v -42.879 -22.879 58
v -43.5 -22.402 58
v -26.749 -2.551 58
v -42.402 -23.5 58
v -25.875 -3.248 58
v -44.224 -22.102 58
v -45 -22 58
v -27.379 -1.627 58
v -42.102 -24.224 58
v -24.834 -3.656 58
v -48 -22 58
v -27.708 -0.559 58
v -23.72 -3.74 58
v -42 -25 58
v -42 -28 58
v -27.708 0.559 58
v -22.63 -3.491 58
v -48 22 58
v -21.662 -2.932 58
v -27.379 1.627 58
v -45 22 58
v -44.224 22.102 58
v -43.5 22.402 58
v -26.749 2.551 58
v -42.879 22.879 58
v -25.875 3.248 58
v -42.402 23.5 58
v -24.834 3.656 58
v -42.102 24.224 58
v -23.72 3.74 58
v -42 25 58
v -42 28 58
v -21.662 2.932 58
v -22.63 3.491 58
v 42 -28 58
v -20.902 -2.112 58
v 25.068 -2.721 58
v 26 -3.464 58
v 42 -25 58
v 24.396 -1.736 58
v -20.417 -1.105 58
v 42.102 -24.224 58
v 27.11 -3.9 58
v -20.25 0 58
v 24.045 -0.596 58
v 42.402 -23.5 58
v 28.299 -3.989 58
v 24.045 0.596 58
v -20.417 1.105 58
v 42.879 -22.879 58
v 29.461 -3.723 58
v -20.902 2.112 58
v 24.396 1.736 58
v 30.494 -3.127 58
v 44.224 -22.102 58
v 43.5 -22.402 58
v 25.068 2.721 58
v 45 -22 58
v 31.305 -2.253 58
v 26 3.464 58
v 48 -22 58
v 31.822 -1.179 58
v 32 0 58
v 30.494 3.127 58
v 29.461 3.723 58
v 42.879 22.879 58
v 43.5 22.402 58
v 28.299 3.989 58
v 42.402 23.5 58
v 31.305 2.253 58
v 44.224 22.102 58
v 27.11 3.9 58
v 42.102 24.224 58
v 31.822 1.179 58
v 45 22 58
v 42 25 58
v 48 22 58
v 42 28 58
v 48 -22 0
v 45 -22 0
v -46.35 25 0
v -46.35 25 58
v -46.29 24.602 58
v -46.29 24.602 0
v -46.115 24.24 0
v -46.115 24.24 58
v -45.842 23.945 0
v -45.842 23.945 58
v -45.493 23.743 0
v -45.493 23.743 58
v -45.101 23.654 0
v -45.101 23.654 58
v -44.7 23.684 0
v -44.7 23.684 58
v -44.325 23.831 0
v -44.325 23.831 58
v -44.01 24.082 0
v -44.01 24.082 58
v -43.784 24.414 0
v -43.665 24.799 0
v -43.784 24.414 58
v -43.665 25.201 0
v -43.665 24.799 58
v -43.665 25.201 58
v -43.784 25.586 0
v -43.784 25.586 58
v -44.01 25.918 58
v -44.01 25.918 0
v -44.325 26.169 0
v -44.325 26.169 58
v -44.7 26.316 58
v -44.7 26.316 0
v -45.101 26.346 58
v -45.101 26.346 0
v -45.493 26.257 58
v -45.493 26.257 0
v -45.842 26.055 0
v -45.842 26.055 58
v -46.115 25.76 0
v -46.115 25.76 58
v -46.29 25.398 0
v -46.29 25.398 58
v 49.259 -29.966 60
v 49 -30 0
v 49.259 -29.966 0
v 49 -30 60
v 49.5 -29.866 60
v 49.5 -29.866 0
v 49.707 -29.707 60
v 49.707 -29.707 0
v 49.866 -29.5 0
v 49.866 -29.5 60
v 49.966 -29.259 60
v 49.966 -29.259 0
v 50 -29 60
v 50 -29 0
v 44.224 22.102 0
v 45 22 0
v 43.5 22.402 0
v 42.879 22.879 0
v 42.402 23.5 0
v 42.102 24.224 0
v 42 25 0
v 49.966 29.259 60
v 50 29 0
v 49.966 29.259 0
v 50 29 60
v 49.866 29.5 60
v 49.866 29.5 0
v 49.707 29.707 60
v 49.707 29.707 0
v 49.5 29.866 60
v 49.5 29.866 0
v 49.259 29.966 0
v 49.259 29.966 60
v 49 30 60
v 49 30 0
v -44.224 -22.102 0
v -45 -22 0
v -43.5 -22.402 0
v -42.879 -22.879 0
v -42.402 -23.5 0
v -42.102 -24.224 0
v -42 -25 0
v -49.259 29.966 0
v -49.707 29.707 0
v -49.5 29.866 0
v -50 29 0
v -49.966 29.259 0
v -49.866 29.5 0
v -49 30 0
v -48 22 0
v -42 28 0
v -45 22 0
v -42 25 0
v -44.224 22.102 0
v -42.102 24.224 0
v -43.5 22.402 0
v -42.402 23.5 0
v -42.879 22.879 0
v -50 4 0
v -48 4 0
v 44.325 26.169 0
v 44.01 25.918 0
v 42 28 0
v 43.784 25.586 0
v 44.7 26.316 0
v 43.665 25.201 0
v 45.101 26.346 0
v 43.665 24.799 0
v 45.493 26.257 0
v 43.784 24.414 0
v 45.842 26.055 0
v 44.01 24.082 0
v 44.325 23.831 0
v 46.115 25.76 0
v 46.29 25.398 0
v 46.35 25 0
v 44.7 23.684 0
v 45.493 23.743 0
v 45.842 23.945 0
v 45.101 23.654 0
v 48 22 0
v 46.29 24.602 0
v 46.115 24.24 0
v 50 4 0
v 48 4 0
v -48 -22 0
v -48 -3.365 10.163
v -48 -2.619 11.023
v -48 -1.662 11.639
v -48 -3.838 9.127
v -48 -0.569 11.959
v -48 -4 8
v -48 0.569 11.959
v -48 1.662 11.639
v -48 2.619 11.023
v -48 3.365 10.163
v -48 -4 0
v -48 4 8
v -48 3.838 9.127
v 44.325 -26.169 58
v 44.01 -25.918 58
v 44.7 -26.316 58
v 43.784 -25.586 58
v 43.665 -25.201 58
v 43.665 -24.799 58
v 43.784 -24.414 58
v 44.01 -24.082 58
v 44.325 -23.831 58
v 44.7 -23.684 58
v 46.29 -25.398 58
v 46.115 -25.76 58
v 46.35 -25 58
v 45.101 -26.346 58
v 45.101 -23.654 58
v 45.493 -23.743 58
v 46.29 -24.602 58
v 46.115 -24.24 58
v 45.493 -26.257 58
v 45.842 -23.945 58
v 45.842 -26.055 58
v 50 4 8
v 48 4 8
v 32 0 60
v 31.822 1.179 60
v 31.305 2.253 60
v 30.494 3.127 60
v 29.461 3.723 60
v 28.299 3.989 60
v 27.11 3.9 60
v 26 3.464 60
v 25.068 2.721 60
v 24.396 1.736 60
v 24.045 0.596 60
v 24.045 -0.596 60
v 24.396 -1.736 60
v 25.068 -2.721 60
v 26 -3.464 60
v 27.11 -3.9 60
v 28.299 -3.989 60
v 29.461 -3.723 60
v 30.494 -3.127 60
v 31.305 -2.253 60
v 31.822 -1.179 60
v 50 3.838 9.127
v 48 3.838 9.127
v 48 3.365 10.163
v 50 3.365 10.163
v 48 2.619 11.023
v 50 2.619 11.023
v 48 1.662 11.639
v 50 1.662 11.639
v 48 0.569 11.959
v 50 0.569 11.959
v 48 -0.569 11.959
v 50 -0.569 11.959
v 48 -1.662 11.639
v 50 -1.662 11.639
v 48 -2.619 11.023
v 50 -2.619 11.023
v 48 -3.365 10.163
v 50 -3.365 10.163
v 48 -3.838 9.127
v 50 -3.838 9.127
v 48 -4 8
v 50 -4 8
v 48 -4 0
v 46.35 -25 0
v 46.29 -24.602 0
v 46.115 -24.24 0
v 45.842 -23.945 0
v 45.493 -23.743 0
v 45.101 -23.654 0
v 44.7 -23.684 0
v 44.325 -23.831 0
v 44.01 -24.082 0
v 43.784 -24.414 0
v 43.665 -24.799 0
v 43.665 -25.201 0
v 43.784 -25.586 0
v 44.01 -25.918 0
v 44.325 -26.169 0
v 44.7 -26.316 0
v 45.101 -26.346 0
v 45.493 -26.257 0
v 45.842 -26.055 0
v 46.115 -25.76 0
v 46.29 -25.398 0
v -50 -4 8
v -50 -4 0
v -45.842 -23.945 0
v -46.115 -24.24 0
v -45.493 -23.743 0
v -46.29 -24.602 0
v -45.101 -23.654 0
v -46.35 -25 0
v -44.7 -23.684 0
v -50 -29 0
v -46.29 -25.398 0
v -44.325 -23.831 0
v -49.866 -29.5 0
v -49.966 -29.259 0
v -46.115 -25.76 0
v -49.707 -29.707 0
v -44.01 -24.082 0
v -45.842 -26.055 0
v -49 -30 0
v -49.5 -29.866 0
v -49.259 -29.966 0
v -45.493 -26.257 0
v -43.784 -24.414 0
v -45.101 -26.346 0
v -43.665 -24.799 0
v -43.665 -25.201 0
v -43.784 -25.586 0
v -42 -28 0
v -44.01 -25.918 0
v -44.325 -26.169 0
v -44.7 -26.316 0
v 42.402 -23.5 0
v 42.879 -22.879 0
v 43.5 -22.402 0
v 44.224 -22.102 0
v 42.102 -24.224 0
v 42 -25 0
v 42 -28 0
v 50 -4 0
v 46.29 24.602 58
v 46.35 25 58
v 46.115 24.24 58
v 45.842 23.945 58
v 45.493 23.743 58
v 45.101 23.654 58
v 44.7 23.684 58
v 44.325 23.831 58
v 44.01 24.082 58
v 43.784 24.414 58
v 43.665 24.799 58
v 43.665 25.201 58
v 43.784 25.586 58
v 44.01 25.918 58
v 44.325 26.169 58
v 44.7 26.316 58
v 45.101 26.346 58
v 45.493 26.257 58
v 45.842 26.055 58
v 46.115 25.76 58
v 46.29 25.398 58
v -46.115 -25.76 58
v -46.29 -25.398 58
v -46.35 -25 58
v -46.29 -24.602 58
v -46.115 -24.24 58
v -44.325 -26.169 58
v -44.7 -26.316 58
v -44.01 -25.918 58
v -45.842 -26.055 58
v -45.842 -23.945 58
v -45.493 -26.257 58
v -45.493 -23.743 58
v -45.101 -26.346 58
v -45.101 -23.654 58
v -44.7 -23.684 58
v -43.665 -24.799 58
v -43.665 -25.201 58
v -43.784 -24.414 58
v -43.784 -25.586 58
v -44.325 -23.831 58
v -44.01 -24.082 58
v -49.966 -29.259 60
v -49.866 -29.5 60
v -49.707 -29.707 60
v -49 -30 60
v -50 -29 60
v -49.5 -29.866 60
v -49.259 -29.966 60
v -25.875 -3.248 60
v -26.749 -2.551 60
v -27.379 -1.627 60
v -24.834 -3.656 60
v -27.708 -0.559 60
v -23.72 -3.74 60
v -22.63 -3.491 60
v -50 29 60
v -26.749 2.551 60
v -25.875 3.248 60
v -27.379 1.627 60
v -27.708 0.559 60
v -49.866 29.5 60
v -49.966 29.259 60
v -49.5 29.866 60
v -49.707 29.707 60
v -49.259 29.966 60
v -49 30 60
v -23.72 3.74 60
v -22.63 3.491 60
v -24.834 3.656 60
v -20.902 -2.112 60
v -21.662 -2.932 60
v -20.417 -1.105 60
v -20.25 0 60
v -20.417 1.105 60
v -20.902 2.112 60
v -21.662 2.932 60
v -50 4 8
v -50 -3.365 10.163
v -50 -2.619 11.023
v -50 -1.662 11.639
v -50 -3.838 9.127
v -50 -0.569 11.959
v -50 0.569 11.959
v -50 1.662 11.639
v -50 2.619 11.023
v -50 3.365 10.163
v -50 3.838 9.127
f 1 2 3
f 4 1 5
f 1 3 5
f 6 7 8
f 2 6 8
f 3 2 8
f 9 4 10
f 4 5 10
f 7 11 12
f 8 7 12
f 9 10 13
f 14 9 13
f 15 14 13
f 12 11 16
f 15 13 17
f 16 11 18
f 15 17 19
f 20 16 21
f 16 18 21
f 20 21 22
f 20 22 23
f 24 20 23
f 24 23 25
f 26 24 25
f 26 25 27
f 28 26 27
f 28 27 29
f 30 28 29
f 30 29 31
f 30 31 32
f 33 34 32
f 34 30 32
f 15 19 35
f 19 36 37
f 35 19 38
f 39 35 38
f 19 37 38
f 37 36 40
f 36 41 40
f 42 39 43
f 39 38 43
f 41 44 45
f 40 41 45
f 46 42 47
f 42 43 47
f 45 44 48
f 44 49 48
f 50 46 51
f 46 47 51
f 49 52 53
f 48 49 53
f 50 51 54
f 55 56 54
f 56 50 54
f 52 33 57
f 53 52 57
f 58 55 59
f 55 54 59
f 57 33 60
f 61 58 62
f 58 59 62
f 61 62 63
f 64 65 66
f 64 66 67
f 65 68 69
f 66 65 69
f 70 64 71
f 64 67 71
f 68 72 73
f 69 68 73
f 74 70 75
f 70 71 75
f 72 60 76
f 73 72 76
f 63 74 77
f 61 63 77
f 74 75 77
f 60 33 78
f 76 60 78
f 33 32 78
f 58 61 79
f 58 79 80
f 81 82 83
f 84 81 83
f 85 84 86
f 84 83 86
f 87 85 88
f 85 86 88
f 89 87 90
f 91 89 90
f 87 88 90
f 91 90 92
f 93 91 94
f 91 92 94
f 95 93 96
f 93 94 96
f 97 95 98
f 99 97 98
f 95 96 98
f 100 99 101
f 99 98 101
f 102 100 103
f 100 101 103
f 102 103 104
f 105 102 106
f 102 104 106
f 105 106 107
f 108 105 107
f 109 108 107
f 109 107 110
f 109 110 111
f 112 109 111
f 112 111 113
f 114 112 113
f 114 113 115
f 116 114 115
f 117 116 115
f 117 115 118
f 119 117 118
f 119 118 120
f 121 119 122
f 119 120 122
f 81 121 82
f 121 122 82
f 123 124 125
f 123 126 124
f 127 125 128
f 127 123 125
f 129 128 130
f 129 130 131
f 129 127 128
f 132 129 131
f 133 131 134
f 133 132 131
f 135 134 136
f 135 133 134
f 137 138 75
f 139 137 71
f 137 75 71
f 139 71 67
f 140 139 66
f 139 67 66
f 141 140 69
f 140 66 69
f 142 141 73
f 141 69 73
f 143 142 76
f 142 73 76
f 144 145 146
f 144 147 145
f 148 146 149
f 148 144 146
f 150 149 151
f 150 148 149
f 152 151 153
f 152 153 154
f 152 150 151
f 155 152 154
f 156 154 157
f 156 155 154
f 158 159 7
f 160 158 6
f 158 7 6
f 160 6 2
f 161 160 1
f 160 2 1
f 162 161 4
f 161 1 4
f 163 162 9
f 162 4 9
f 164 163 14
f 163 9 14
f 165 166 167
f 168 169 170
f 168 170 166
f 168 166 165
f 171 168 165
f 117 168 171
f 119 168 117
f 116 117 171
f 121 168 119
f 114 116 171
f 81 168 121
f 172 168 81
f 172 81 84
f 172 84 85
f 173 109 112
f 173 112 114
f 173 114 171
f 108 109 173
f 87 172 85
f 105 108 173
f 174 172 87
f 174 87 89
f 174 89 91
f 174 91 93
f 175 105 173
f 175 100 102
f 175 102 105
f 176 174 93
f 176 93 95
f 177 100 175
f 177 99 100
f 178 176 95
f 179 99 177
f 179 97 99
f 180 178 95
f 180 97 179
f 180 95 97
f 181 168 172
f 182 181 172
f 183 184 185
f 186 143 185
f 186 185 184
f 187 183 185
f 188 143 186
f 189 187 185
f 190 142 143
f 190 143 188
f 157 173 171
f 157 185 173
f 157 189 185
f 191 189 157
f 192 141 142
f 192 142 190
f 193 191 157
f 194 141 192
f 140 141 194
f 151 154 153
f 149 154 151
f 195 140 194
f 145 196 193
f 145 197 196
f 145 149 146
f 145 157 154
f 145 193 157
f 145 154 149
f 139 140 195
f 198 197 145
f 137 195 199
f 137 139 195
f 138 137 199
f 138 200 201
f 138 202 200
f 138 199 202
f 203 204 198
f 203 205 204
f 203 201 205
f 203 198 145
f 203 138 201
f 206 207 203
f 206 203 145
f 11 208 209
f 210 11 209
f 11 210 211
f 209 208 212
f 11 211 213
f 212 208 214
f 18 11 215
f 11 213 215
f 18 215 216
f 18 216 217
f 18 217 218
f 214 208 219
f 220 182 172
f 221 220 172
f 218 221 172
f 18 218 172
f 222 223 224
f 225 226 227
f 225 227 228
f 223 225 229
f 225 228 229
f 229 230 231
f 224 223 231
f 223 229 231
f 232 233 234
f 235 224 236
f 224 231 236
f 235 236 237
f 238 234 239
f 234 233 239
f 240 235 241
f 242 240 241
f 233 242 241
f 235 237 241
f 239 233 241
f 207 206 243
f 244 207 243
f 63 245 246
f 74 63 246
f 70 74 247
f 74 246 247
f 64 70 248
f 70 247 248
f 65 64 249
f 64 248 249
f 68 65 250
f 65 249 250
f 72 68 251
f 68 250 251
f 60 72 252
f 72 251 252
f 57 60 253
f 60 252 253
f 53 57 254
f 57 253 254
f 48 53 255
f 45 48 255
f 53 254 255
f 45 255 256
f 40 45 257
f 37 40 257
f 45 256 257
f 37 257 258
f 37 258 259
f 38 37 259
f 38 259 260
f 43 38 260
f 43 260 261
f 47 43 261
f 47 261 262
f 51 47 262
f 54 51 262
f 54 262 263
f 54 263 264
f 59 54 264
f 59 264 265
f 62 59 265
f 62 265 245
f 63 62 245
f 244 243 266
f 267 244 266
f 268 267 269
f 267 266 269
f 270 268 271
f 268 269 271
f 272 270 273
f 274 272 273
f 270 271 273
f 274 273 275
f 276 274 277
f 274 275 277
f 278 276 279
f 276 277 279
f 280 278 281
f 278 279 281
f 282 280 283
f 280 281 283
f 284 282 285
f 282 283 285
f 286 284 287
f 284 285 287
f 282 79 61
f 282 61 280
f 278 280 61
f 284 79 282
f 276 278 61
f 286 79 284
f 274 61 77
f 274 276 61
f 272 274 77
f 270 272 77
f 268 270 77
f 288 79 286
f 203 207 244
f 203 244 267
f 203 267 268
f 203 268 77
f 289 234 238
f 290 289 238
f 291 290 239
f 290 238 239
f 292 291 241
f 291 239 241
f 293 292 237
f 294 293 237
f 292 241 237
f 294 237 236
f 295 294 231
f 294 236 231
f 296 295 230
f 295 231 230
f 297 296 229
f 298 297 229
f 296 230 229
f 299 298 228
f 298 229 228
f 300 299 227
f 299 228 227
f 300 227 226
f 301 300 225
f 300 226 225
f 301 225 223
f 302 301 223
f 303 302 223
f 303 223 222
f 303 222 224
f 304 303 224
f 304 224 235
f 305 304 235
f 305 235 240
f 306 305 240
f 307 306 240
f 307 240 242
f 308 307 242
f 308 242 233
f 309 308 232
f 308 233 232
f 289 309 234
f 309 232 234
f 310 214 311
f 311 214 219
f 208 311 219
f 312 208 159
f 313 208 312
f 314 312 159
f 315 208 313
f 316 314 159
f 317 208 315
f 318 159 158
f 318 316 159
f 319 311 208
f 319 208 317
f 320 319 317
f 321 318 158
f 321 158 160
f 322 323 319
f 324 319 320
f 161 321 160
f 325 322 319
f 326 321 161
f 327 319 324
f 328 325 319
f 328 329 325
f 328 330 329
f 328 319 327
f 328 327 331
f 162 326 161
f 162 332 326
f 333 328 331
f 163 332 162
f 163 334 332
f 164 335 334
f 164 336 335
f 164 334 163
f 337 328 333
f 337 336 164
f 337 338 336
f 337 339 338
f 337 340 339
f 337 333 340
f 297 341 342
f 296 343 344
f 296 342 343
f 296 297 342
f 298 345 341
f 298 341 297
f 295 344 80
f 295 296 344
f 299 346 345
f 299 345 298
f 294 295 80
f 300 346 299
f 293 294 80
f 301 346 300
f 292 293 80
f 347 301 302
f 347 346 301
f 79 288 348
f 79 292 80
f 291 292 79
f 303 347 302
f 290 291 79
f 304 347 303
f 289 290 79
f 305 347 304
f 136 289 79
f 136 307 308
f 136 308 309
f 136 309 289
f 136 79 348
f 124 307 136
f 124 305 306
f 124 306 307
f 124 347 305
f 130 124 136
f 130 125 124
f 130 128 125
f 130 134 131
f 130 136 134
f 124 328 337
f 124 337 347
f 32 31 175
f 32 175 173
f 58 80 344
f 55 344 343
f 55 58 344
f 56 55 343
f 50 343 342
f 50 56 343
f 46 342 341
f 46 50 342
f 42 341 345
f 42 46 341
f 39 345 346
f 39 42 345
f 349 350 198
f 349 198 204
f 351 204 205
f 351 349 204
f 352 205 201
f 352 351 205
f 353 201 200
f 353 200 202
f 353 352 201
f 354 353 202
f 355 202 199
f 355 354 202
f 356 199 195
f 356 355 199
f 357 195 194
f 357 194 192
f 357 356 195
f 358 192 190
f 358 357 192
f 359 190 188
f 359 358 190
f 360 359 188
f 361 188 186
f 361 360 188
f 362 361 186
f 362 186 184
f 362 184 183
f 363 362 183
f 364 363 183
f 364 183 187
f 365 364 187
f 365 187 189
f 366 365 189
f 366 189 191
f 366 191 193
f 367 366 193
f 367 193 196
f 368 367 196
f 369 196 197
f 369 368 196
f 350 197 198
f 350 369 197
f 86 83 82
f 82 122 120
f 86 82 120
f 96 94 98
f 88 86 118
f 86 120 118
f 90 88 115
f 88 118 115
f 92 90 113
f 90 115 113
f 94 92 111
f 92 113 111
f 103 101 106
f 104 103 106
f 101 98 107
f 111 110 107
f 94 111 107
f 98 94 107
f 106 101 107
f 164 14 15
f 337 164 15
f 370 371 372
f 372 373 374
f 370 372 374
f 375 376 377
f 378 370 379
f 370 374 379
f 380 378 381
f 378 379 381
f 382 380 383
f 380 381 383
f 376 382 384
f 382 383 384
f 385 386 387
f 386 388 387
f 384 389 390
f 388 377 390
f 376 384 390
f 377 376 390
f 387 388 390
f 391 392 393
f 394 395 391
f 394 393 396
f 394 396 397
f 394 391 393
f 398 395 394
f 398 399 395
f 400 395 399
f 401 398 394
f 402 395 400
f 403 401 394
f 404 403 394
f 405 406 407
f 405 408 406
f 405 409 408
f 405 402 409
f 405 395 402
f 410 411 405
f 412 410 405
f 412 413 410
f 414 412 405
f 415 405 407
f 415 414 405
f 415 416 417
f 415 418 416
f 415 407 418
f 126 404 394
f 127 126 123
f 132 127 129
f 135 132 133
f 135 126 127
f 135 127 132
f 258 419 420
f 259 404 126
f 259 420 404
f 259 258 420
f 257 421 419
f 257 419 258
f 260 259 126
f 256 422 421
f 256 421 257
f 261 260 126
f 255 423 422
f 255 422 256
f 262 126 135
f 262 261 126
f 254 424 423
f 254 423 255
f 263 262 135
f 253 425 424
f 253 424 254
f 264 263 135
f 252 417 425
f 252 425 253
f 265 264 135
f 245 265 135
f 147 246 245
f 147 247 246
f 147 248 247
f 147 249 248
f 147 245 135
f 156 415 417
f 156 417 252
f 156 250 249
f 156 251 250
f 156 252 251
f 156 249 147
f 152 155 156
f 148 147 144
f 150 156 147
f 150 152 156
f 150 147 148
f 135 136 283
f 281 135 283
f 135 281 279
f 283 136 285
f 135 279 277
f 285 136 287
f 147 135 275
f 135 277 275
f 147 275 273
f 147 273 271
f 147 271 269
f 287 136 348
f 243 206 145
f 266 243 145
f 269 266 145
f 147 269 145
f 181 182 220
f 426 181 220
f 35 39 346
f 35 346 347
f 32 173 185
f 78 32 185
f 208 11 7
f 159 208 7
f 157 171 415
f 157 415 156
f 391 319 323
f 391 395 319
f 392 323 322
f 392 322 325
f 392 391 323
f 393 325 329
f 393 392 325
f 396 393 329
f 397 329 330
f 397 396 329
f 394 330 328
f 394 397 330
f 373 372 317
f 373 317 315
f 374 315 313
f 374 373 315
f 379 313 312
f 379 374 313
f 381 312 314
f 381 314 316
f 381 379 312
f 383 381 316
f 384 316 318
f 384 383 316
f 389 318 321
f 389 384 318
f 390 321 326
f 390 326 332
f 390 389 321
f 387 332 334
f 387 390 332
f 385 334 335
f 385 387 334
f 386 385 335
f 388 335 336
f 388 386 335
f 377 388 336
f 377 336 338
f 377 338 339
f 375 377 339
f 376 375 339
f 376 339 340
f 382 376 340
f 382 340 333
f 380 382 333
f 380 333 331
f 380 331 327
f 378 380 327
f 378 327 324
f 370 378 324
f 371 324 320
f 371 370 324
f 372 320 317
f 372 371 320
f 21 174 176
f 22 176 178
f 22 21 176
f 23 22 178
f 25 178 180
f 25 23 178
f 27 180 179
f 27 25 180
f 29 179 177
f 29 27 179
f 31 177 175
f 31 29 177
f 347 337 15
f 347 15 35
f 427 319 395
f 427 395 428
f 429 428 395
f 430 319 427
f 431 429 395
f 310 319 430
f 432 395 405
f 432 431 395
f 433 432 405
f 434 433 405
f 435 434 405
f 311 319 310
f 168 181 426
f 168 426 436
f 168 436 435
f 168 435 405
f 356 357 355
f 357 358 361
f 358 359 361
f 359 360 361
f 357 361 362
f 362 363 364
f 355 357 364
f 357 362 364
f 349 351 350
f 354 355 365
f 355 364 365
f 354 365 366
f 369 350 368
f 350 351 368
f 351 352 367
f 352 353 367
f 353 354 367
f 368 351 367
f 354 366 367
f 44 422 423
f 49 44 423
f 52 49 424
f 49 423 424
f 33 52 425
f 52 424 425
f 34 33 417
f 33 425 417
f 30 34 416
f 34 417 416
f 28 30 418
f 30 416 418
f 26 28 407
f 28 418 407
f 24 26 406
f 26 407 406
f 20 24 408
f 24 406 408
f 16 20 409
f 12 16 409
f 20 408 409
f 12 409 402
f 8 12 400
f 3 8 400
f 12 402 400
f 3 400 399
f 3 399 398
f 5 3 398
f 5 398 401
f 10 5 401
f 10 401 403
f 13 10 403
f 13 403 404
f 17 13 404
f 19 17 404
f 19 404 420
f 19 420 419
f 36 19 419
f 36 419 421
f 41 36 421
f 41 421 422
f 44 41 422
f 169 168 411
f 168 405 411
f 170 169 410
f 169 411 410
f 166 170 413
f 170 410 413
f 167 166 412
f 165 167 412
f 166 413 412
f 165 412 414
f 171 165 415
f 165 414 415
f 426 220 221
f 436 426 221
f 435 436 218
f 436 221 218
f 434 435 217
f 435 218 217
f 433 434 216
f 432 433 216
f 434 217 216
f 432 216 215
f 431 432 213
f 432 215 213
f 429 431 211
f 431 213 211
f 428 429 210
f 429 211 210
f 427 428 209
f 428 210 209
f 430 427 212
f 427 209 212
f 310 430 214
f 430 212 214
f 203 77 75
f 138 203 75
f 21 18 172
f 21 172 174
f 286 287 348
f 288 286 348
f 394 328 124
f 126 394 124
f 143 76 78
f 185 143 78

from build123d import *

# Parameters (mm, degrees)
SKETCH1_W               = 100
SKETCH1_H               = 60
BOSS_EXTRUDE1_DEPTH     = 60
SHELL1_T                = -2
SKETCH2_R               = 3.75
SKETCH2_R_2             = 4
CUT_EXTRUDE1_DEPTH      = 60
SKETCH3_R               = 1.35
BOSS_EXTRUDE4_DEPTH     = 58
MIRROR2_COPY_1_SKETCH_R = 1.35
MIRROR2_COPY_1_DEPTH    = 58
FILLET1_R               = 1
CUT_EXTRUDE2_DEPTH      = 121.415945788


with BuildPart() as part:
    # Sketch1 → Boss-Extrude1 (new body)
    with BuildSketch(Plane.XY):
        Rectangle(SKETCH1_W, SKETCH1_H)
    extrude(amount=BOSS_EXTRUDE1_DEPTH)

    # Shell1
    shell1_openings = [part.faces().sort_by_distance(p)[0] for p in [
        (0, 0, 0),
    ]]
    offset(amount=SHELL1_T, openings=shell1_openings, kind=Kind.INTERSECTION)

    # Sketch2 → Cut-Extrude1 (cut)
    with BuildSketch(Plane.XY.offset(60)):
        with Locations((-24, 0)):
            Circle(SKETCH2_R)
        with Locations((28, 0)):
            Circle(SKETCH2_R_2)
    extrude(amount=-CUT_EXTRUDE1_DEPTH, mode=Mode.SUBTRACT)

    # Sketch3 → Boss-Extrude4 (add)
    with BuildSketch(Plane(origin=(0, 0, 58), x_dir=(-1, 0, 0), z_dir=(0, 0, -1))):
        with BuildLine():
            Line((-42, 25), (-42, 28))
            Line((-42, 28), (-48, 28))
            Line((-48, 28), (-48, 22))
            Line((-48, 22), (-45, 22))
            ThreePointArc((-45, 22), (-42.878679656, 22.878679656), (-42, 25))
        make_face()
        with Locations(Location((-45, 25, 0), (0, 0, 180))):
            Circle(SKETCH3_R, mode=Mode.SUBTRACT)
    boss_extrude4 = extrude(amount=BOSS_EXTRUDE4_DEPTH)

    # Mirror1: Boss-Extrude4 across plane
    add(boss_extrude4.mirror(Plane(origin=(0, 0, 0), x_dir=(0, 0, 1), z_dir=(1, 0, 0))))

    # Mirror2: Boss-Extrude4 across plane
    add(boss_extrude4.mirror(Plane.ZX))

    # Mirror2 copy 1 sketch → Mirror2 copy 1 (add)
    with BuildSketch(Plane(origin=(0, 0, 58), x_dir=(1, 0, 0), z_dir=(0, 0, -1))):
        with BuildLine():
            Line((-42, 25), (-42, 28))
            Line((-42, 28), (-48, 28))
            Line((-48, 28), (-48, 22))
            Line((-48, 22), (-45, 22))
            ThreePointArc((-45, 22), (-42.878679656, 22.878679656), (-42, 25))
        make_face()
        with Locations(Location((-45, 25, 0), (0, 0, 180))):
            Circle(MIRROR2_COPY_1_SKETCH_R, mode=Mode.SUBTRACT)
    extrude(amount=MIRROR2_COPY_1_DEPTH)

    # Fillet1
    fillet1_edges = [part.edges().sort_by_distance(p)[0] for p in [
        (-50, 30, 30),
        (50, 30, 30),
        (50, -30, 30),
        (-50, -30, 30),
    ]]
    fillet(fillet1_edges, radius=FILLET1_R)

    # Sketch4 → Cut-Extrude2 (cut, through all)
    with BuildSketch(Plane(origin=(50, 0, 0), x_dir=(0, 0, -1), z_dir=(1, 0, 0))):
        with BuildLine():
            Line((-8, -4), (0, -4))
            Line((0, -4), (0, 4))
            Line((0, 4), (-8, 4))
            ThreePointArc((-8, 4), (-12, 0), (-8, -4))
        make_face()
    extrude(amount=-CUT_EXTRUDE2_DEPTH, mode=Mode.SUBTRACT)


solid = part.part
